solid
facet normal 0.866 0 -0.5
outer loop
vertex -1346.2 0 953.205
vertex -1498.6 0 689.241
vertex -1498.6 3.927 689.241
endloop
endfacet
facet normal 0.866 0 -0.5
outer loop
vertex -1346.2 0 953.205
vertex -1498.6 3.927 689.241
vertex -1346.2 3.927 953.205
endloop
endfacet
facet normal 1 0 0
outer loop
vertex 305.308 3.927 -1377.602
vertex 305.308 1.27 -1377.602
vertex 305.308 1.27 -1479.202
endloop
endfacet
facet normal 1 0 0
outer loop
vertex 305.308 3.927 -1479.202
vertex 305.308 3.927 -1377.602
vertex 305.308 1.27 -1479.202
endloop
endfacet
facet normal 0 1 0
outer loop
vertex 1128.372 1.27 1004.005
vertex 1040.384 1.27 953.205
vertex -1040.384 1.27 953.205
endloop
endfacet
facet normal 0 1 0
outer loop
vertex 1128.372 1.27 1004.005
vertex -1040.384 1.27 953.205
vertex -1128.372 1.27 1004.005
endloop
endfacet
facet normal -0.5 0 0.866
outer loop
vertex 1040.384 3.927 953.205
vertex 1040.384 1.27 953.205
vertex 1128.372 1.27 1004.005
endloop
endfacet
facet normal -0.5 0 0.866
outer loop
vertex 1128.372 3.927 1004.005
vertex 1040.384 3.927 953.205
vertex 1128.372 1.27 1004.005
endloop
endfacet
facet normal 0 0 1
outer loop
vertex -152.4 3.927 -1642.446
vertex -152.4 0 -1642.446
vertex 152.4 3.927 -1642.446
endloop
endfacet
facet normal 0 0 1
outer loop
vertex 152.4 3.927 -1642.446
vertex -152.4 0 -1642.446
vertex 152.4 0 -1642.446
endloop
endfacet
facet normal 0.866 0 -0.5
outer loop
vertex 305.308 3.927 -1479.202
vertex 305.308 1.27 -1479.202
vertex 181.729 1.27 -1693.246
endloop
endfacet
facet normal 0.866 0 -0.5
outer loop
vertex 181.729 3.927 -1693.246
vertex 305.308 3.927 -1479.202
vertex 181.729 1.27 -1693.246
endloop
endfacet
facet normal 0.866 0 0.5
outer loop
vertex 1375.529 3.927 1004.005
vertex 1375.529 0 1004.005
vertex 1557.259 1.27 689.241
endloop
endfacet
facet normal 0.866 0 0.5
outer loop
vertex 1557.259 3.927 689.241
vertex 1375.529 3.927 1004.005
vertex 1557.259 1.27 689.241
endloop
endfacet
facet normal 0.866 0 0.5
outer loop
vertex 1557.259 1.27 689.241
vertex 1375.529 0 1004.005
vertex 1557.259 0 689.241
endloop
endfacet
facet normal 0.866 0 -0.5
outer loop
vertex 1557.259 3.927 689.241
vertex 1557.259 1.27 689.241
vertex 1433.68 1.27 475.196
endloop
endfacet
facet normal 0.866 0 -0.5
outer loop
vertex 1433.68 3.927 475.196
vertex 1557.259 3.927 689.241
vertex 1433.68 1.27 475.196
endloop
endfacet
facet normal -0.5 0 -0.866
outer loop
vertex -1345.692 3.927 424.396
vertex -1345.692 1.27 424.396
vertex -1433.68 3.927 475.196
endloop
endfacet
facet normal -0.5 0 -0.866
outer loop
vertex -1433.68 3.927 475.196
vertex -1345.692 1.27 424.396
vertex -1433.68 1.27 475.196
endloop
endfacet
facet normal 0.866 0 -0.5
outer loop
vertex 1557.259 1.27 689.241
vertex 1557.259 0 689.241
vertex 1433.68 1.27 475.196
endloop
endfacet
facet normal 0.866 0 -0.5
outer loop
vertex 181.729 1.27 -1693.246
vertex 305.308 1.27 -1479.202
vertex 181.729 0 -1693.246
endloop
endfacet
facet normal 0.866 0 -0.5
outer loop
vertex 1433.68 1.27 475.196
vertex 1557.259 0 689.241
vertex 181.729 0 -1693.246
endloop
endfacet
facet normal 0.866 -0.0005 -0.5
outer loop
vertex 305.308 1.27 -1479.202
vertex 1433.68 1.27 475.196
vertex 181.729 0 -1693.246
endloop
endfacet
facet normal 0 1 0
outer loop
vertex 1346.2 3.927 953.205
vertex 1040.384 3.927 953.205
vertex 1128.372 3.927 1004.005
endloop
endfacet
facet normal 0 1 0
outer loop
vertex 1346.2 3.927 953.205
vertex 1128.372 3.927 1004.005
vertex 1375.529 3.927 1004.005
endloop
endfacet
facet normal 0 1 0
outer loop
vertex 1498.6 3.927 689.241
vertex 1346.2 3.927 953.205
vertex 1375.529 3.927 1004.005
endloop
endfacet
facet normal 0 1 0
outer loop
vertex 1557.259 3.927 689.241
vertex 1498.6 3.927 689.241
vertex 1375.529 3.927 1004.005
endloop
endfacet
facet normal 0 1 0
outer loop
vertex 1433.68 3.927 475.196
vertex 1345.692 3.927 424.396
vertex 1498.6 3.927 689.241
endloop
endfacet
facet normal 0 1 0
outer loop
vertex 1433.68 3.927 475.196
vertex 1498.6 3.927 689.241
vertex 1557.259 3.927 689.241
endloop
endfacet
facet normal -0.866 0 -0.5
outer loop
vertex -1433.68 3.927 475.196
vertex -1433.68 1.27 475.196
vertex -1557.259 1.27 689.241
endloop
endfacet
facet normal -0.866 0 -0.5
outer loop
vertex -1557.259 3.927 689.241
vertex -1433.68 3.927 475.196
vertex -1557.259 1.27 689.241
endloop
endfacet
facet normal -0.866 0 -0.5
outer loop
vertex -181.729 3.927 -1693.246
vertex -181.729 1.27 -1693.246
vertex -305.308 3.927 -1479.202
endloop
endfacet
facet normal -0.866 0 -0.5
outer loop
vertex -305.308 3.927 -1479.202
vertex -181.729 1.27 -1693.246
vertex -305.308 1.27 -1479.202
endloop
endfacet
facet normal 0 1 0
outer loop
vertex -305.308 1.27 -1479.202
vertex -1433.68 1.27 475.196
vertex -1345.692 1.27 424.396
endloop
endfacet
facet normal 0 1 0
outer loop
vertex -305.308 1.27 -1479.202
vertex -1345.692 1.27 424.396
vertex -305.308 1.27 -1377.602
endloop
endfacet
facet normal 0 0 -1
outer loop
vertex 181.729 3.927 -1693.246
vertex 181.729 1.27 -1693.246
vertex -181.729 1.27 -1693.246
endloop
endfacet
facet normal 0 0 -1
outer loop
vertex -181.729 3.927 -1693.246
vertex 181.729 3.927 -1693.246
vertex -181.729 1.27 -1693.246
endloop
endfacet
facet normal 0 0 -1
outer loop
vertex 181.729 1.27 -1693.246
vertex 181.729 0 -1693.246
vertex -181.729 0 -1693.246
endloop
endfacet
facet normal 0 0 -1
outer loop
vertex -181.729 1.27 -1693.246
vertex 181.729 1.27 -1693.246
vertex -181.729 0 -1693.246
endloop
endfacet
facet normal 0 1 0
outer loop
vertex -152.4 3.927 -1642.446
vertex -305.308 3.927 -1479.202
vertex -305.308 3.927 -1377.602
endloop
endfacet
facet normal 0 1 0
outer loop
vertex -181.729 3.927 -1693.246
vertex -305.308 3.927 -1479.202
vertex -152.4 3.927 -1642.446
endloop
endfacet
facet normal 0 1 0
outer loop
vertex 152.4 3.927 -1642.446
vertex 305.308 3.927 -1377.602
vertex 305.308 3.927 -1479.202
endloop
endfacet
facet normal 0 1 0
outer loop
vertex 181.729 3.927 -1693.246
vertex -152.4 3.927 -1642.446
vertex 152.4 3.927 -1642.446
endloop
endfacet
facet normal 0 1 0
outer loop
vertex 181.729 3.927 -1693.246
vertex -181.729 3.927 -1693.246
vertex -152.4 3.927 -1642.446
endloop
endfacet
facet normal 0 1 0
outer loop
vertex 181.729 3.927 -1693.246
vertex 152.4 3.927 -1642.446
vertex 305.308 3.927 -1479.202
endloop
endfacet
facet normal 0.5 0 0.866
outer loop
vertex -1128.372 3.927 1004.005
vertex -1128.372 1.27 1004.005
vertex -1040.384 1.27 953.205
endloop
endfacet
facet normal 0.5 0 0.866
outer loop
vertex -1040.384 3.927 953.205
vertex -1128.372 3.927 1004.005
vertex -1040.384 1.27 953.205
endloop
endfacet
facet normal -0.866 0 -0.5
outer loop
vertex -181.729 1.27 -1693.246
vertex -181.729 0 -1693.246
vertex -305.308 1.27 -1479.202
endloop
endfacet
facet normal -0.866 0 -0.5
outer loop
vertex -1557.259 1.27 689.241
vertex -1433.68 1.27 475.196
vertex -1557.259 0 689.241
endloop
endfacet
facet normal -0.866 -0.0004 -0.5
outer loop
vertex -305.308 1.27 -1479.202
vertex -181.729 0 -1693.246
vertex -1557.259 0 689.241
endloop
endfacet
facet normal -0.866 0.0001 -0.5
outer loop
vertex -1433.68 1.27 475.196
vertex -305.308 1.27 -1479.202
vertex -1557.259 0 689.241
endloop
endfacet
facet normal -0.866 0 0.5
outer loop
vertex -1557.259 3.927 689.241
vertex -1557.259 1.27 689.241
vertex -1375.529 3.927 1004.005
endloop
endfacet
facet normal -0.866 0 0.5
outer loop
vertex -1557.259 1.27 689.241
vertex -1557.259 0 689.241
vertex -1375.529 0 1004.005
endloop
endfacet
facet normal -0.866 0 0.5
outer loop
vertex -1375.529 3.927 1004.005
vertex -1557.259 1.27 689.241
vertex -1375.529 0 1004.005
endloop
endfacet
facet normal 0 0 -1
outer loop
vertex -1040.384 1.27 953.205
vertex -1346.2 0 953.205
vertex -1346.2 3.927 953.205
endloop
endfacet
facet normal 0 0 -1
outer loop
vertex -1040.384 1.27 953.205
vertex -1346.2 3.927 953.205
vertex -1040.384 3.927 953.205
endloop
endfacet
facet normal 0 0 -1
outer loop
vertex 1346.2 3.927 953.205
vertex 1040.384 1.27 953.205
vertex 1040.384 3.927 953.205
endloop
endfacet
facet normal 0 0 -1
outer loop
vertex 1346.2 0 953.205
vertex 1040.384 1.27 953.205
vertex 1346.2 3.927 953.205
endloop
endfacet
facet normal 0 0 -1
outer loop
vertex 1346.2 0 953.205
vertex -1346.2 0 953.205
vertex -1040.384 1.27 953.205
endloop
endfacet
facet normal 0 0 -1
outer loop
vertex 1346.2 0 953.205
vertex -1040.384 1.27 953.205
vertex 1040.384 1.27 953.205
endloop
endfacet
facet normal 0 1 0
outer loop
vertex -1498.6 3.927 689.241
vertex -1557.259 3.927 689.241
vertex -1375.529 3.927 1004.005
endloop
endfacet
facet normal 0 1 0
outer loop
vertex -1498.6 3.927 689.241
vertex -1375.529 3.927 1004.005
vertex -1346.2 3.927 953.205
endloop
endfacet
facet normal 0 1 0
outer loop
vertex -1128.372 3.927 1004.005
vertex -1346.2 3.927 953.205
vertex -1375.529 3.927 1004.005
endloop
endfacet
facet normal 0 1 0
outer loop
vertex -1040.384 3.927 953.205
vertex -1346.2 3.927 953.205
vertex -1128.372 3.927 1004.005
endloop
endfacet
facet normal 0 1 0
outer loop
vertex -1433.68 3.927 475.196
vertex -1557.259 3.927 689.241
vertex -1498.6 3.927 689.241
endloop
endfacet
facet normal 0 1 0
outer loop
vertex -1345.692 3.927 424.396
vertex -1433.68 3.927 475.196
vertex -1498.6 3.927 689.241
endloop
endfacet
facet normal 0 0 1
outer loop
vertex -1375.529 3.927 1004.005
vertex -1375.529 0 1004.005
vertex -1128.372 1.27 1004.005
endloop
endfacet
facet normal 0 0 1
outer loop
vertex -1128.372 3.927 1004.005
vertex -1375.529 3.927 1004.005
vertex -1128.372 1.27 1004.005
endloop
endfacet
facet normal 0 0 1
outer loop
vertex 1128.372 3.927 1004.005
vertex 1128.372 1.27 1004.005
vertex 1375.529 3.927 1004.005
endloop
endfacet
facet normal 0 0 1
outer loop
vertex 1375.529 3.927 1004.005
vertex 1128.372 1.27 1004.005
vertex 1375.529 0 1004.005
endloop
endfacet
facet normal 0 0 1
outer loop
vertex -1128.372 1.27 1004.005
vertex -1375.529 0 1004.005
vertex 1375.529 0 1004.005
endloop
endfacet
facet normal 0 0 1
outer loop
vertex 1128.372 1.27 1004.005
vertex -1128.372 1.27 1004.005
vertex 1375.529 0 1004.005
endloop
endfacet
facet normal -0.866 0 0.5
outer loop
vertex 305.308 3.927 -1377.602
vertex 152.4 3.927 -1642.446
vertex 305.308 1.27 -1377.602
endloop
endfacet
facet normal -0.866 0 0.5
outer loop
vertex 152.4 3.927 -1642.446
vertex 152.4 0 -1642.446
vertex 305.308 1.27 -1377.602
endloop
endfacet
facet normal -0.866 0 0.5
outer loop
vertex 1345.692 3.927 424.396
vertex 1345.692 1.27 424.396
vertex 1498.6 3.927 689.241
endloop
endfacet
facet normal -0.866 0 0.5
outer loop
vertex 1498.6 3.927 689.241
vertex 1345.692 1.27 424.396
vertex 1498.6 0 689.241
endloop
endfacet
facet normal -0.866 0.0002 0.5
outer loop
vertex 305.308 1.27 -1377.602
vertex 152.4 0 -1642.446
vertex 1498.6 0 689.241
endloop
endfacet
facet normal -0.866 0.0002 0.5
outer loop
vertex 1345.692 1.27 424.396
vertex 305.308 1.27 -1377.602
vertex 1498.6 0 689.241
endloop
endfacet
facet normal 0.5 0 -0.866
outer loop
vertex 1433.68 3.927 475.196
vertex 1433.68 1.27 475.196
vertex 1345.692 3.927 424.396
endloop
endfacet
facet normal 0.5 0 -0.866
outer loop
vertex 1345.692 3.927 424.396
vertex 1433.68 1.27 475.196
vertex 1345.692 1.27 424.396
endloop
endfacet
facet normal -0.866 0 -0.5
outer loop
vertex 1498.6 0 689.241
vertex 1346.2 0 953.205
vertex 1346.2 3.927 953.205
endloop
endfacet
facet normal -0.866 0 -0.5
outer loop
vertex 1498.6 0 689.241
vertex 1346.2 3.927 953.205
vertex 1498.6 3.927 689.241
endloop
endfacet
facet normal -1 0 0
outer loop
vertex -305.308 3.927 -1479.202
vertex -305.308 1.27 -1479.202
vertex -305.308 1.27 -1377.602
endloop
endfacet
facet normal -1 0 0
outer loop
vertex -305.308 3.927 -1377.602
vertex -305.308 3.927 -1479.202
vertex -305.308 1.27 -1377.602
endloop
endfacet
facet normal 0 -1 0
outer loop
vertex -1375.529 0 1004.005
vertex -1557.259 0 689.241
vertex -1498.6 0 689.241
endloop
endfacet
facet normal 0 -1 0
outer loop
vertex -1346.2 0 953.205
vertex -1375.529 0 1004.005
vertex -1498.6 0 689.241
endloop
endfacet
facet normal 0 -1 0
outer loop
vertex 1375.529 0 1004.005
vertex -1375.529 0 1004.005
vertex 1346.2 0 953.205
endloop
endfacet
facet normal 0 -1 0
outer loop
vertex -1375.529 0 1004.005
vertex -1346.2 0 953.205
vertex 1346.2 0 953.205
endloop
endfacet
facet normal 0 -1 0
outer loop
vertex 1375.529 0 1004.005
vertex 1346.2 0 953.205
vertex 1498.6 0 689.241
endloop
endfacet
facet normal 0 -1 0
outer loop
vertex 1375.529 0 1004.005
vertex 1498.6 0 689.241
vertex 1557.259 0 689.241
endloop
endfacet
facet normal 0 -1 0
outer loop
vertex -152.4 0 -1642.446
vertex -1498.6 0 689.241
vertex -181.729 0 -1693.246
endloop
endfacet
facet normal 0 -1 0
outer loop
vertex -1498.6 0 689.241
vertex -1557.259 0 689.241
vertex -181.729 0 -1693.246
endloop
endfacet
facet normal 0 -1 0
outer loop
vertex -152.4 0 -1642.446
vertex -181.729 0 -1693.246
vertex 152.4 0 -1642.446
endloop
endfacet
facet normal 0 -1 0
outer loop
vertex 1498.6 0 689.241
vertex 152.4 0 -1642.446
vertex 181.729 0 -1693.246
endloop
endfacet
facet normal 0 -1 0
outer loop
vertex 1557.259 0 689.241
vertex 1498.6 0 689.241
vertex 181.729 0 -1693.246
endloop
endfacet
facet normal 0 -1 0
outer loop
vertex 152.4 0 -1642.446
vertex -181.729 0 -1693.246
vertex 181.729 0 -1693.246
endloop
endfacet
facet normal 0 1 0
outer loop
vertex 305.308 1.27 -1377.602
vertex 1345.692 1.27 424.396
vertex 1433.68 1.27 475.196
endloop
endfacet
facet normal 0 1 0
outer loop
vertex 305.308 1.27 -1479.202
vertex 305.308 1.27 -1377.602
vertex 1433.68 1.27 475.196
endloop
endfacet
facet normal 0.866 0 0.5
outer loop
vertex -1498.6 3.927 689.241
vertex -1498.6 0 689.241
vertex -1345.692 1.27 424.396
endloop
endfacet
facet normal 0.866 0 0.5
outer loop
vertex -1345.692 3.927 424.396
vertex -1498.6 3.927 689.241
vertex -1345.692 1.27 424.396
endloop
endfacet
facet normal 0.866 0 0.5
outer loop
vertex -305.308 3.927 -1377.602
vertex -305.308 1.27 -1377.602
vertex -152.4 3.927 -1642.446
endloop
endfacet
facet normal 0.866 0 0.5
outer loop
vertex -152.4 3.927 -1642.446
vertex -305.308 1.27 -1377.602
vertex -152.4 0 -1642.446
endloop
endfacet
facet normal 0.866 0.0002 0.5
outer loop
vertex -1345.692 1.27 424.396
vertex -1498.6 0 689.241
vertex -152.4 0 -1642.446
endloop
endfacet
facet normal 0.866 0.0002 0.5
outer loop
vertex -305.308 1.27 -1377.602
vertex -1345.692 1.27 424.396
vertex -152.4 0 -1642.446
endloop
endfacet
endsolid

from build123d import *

# Parameters (mm, degrees)
BOSS_EXTRUDE1_DEPTH = 1.27
BOSS_EXTRUDE2_DEPTH = 2.65684


with BuildPart() as part:
    # Sketch1 → Boss-Extrude1 (new body)
    with BuildSketch(Plane(origin=(0, 0, 0), x_dir=(1, 0, 0), z_dir=(0, 1, 0))):
        Polygon((1557.25878735, -689.240751359), (181.729393675, 1693.246045791), (-181.729393675, 1693.246045791), (-1557.25878735, -689.240751359), (-1375.529393675, -1004.005294432), (1375.529393675, -1004.005294432), align=None)
        Polygon((152.4, 1642.446045791), (-152.4, 1642.446045791), (-1498.6, -689.240751359), (-1346.2, -953.205294432), (1346.2, -953.205294432), (1498.6, -689.240751359), align=None, mode=Mode.SUBTRACT)
    extrude(amount=BOSS_EXTRUDE1_DEPTH)

    # Sketch2 → Boss-Extrude2 (add)
    with BuildSketch(Plane(origin=(0, 1.27, 0), x_dir=(1, 0, 0), z_dir=(0, 1, 0))):
        Polygon((-181.729393675, 1693.246045791), (-305.308, 1479.201620907), (-305.308, 1377.601620907), (-152.4, 1642.446045791), (152.4, 1642.446045791), (305.308, 1377.601620907), (305.308, 1479.201620907), (181.729393675, 1693.246045791), align=None)
        Polygon((1557.25878735, -689.240751359), (1433.680181024, -475.196326475), (1345.692, -424.396326475), (1498.6, -689.240751359), (1346.2, -953.205294432), (1040.384, -953.205294432), (1128.372181024, -1004.005294432), (1375.529393675, -1004.005294432), align=None)
        Polygon((-1345.692, -424.396326475), (-1433.680181024, -475.196326475), (-1557.25878735, -689.240751359), (-1375.529393675, -1004.005294432), (-1128.372181024, -1004.005294432), (-1040.384, -953.205294432), (-1346.2, -953.205294432), (-1498.6, -689.240751359), align=None)
    extrude(amount=BOSS_EXTRUDE2_DEPTH)


solid = part.part
